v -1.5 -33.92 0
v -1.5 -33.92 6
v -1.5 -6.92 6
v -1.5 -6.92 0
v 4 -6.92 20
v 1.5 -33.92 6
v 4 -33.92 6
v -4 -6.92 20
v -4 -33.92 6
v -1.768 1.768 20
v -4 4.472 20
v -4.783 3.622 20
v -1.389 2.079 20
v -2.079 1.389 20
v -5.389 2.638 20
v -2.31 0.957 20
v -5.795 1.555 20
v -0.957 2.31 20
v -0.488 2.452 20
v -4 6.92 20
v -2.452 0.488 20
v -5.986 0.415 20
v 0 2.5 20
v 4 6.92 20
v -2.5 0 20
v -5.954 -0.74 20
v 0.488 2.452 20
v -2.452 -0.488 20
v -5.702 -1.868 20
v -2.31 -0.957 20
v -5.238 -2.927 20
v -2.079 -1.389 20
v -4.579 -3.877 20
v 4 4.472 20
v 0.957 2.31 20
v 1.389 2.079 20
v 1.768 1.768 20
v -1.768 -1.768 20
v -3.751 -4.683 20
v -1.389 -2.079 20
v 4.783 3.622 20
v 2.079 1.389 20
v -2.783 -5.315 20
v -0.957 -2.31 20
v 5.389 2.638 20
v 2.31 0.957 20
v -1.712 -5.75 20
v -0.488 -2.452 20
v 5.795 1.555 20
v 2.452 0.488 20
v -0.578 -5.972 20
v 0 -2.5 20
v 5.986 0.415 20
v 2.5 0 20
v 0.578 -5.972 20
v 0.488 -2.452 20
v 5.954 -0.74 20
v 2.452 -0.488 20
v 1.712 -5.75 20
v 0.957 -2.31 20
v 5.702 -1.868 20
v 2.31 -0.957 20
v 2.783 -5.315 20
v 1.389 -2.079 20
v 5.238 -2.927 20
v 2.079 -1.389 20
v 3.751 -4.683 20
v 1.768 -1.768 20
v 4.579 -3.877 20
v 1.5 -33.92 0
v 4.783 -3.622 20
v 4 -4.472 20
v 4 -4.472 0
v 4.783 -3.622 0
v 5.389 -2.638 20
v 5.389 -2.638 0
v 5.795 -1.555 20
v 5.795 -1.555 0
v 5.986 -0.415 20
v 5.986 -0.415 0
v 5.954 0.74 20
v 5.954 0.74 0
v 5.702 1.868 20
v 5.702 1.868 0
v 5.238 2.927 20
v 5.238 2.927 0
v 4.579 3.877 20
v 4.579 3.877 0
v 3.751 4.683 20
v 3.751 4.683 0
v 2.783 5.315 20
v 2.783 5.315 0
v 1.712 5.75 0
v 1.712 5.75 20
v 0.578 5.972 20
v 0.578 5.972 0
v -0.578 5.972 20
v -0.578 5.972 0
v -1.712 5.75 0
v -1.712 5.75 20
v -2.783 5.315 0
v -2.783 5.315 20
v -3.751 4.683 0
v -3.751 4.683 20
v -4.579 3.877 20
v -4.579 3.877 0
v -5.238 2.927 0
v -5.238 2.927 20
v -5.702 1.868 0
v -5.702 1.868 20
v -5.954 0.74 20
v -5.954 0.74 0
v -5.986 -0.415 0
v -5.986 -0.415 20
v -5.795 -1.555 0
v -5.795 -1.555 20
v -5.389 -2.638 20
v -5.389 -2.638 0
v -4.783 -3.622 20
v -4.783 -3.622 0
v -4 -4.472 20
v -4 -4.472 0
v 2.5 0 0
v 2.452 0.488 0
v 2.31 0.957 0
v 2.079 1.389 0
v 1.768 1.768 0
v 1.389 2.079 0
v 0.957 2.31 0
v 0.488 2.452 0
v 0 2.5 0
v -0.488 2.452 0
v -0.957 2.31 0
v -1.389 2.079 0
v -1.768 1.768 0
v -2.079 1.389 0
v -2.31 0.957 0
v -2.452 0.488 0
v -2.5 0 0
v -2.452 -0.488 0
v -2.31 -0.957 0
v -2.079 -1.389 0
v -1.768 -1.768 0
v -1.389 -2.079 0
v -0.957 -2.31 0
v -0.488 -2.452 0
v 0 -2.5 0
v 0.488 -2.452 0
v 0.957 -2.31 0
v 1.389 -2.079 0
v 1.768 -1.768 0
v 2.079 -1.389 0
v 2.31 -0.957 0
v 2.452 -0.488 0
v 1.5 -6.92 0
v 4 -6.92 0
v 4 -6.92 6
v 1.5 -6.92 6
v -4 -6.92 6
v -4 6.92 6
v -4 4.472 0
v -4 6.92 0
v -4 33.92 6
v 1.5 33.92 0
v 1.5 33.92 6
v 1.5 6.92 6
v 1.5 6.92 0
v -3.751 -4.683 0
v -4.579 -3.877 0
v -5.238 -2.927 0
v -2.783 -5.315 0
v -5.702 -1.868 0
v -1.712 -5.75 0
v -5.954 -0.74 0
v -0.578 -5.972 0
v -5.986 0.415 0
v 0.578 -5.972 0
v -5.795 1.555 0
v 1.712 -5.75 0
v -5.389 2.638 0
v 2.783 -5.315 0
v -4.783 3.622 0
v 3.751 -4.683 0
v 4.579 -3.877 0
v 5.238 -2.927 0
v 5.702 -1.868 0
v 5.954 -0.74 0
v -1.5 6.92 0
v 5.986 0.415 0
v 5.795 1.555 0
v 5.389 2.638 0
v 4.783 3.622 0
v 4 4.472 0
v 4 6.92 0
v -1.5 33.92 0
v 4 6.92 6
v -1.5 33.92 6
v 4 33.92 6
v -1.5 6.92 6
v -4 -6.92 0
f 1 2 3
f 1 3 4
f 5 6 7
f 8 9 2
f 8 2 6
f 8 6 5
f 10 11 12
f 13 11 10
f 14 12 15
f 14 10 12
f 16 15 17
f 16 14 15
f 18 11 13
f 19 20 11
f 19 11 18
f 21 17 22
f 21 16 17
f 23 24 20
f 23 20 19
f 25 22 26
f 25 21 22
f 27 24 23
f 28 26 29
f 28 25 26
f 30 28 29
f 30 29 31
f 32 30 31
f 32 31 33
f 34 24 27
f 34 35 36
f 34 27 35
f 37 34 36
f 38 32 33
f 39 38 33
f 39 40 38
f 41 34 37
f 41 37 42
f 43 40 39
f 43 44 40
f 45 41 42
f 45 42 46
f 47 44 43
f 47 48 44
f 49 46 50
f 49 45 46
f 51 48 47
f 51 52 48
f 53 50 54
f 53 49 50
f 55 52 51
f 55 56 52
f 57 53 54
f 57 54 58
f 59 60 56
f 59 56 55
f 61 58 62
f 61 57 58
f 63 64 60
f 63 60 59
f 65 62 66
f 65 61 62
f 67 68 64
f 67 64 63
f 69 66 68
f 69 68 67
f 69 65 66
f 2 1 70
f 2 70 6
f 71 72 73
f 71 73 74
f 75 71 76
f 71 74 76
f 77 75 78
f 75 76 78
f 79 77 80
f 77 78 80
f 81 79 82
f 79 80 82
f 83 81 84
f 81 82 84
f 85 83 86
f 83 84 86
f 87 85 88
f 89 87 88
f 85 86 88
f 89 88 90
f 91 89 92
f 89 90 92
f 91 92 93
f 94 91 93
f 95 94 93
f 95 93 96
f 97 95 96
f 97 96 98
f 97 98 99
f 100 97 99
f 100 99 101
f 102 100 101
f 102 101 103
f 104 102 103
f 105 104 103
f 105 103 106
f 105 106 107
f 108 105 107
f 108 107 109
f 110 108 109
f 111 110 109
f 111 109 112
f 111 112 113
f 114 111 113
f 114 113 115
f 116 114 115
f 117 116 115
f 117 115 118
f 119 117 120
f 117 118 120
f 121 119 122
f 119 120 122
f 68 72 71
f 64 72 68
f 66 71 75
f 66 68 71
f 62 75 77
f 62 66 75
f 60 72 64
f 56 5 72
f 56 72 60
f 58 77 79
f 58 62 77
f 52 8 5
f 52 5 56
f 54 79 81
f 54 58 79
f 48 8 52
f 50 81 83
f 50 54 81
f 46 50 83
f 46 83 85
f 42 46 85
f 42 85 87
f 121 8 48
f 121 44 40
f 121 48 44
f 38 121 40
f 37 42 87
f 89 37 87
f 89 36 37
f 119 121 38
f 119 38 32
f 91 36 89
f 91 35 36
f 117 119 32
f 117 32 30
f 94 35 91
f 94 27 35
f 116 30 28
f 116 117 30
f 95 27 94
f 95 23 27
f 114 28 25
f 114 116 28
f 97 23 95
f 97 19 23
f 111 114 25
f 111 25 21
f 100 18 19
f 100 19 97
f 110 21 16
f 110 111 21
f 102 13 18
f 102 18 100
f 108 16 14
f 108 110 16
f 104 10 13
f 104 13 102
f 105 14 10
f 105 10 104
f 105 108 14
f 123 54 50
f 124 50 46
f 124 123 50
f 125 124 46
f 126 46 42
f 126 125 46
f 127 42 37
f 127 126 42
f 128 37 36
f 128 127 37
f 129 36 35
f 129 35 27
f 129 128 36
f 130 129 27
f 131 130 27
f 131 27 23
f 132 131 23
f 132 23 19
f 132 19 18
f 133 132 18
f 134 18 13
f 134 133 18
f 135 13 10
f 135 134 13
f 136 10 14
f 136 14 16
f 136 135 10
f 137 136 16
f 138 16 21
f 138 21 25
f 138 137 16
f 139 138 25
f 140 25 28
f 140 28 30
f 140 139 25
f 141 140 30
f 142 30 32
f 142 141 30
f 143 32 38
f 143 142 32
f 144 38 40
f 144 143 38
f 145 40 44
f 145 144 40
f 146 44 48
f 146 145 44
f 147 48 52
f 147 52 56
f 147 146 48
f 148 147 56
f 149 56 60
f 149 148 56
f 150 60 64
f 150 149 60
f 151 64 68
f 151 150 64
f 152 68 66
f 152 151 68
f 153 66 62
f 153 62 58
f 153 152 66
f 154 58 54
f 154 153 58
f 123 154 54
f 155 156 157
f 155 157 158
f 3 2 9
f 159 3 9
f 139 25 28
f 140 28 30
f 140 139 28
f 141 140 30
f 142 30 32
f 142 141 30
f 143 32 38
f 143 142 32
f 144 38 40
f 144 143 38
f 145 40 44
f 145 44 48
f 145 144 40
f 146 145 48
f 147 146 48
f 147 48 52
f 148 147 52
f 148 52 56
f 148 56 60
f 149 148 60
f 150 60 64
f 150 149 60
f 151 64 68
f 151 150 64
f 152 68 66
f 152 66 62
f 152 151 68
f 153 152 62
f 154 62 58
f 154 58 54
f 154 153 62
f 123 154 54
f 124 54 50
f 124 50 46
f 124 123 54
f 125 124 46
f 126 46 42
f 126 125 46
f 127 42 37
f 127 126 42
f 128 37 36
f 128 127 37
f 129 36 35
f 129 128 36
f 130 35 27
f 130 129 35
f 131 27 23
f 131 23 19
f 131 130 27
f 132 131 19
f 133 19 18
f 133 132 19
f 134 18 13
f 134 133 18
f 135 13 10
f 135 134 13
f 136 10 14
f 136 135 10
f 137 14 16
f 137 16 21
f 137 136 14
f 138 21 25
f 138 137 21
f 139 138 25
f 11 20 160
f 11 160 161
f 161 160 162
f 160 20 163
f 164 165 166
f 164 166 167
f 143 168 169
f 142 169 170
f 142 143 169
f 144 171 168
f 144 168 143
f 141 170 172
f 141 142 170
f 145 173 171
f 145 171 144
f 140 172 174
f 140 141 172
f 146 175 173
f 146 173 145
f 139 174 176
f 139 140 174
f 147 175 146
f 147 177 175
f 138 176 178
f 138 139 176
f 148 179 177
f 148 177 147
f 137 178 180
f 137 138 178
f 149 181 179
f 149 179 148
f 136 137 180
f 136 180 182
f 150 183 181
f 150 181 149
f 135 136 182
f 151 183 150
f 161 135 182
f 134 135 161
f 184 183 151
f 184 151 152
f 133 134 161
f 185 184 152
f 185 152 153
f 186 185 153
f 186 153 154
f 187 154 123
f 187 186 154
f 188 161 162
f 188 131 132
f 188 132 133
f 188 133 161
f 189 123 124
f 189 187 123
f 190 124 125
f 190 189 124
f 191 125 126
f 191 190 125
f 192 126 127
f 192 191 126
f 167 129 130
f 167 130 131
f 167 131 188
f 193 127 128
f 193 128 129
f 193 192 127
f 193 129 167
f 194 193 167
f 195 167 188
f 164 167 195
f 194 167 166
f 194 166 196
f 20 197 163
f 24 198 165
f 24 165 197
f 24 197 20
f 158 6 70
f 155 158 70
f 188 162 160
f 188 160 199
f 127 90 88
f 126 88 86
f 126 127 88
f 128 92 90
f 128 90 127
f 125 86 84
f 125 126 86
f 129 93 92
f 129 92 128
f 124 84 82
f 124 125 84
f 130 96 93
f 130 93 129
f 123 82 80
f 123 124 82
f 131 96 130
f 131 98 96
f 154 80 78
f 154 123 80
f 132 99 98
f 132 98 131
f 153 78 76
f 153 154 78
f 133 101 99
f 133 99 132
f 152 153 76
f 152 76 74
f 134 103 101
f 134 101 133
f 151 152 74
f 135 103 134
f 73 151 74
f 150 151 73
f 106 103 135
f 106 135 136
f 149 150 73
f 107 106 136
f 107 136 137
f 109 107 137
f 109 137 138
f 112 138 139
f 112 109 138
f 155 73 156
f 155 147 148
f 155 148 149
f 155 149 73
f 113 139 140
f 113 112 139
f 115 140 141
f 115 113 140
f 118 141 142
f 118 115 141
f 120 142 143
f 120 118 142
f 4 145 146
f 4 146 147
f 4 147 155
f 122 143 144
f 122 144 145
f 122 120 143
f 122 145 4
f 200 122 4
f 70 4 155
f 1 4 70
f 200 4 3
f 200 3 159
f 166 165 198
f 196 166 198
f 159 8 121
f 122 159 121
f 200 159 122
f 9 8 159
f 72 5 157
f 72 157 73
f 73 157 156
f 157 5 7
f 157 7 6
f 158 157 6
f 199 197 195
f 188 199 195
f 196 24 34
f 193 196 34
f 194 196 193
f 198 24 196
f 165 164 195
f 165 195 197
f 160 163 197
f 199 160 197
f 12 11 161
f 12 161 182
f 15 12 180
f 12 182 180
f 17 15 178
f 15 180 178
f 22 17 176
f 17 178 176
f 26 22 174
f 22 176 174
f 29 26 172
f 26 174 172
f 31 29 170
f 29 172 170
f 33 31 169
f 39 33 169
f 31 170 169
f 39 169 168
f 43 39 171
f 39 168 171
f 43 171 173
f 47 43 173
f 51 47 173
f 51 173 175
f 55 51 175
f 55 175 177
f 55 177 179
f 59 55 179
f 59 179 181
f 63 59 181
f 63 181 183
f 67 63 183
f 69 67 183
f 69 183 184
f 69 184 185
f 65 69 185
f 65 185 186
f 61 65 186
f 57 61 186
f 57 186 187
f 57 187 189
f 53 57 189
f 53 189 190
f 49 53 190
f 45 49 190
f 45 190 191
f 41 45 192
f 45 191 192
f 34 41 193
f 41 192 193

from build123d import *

# Parameters (mm, degrees)
SKETCH1_R             = 6
SKETCH1_R_2           = 2.5
BOSS_EXTRUDE1_DEPTH   = 20
BOSS_EXTRUDE2_DEPTH   = 4
SKETCH3_W             = 2.5
SKETCH3_H             = 6
CUT_EXTRUDE1_DEPTH    = 27.000002
BODY_MOVE_COPY1_ANGLE = 180


with BuildPart() as part:
    # Sketch1 → Boss-Extrude1 (new body)
    with BuildSketch(Plane.XY):
        Circle(SKETCH1_R)
        Circle(SKETCH1_R_2, mode=Mode.SUBTRACT)
    extrude(amount=BOSS_EXTRUDE1_DEPTH)

    # Sketch2 → Boss-Extrude2 (add, symmetric)
    with BuildSketch(Plane(origin=(0, 0, 0), x_dir=(0, 0, -1), z_dir=(1, 0, 0))):
        Polygon((-20, 6.9197719), (-20, 3.9197719), (0, 3.9197719), (0, 33.9197719), (-6, 33.9197719), align=None)
    extrude(amount=BOSS_EXTRUDE2_DEPTH, both=True)

    # Sketch3 → Cut-Extrude1 (cut)
    with BuildSketch(Plane(origin=(0, 33.9197719, 0), x_dir=(1, 0, 0), z_dir=(0, 1, 0))):
        with Locations((-2.75, -3)):
            Rectangle(SKETCH3_W, SKETCH3_H)
        with Locations((2.75, -3)):
            Rectangle(SKETCH3_W, SKETCH3_H)
    extrude(amount=-CUT_EXTRUDE1_DEPTH, mode=Mode.SUBTRACT)


with BuildPart() as body_2:
    # Body-Move/Copy1: copy of part
    add(part.part.rotate(Axis((0, 0, 0), (0, 0, 1)), BODY_MOVE_COPY1_ANGLE))


solid = Compound([part.part, body_2.part])
